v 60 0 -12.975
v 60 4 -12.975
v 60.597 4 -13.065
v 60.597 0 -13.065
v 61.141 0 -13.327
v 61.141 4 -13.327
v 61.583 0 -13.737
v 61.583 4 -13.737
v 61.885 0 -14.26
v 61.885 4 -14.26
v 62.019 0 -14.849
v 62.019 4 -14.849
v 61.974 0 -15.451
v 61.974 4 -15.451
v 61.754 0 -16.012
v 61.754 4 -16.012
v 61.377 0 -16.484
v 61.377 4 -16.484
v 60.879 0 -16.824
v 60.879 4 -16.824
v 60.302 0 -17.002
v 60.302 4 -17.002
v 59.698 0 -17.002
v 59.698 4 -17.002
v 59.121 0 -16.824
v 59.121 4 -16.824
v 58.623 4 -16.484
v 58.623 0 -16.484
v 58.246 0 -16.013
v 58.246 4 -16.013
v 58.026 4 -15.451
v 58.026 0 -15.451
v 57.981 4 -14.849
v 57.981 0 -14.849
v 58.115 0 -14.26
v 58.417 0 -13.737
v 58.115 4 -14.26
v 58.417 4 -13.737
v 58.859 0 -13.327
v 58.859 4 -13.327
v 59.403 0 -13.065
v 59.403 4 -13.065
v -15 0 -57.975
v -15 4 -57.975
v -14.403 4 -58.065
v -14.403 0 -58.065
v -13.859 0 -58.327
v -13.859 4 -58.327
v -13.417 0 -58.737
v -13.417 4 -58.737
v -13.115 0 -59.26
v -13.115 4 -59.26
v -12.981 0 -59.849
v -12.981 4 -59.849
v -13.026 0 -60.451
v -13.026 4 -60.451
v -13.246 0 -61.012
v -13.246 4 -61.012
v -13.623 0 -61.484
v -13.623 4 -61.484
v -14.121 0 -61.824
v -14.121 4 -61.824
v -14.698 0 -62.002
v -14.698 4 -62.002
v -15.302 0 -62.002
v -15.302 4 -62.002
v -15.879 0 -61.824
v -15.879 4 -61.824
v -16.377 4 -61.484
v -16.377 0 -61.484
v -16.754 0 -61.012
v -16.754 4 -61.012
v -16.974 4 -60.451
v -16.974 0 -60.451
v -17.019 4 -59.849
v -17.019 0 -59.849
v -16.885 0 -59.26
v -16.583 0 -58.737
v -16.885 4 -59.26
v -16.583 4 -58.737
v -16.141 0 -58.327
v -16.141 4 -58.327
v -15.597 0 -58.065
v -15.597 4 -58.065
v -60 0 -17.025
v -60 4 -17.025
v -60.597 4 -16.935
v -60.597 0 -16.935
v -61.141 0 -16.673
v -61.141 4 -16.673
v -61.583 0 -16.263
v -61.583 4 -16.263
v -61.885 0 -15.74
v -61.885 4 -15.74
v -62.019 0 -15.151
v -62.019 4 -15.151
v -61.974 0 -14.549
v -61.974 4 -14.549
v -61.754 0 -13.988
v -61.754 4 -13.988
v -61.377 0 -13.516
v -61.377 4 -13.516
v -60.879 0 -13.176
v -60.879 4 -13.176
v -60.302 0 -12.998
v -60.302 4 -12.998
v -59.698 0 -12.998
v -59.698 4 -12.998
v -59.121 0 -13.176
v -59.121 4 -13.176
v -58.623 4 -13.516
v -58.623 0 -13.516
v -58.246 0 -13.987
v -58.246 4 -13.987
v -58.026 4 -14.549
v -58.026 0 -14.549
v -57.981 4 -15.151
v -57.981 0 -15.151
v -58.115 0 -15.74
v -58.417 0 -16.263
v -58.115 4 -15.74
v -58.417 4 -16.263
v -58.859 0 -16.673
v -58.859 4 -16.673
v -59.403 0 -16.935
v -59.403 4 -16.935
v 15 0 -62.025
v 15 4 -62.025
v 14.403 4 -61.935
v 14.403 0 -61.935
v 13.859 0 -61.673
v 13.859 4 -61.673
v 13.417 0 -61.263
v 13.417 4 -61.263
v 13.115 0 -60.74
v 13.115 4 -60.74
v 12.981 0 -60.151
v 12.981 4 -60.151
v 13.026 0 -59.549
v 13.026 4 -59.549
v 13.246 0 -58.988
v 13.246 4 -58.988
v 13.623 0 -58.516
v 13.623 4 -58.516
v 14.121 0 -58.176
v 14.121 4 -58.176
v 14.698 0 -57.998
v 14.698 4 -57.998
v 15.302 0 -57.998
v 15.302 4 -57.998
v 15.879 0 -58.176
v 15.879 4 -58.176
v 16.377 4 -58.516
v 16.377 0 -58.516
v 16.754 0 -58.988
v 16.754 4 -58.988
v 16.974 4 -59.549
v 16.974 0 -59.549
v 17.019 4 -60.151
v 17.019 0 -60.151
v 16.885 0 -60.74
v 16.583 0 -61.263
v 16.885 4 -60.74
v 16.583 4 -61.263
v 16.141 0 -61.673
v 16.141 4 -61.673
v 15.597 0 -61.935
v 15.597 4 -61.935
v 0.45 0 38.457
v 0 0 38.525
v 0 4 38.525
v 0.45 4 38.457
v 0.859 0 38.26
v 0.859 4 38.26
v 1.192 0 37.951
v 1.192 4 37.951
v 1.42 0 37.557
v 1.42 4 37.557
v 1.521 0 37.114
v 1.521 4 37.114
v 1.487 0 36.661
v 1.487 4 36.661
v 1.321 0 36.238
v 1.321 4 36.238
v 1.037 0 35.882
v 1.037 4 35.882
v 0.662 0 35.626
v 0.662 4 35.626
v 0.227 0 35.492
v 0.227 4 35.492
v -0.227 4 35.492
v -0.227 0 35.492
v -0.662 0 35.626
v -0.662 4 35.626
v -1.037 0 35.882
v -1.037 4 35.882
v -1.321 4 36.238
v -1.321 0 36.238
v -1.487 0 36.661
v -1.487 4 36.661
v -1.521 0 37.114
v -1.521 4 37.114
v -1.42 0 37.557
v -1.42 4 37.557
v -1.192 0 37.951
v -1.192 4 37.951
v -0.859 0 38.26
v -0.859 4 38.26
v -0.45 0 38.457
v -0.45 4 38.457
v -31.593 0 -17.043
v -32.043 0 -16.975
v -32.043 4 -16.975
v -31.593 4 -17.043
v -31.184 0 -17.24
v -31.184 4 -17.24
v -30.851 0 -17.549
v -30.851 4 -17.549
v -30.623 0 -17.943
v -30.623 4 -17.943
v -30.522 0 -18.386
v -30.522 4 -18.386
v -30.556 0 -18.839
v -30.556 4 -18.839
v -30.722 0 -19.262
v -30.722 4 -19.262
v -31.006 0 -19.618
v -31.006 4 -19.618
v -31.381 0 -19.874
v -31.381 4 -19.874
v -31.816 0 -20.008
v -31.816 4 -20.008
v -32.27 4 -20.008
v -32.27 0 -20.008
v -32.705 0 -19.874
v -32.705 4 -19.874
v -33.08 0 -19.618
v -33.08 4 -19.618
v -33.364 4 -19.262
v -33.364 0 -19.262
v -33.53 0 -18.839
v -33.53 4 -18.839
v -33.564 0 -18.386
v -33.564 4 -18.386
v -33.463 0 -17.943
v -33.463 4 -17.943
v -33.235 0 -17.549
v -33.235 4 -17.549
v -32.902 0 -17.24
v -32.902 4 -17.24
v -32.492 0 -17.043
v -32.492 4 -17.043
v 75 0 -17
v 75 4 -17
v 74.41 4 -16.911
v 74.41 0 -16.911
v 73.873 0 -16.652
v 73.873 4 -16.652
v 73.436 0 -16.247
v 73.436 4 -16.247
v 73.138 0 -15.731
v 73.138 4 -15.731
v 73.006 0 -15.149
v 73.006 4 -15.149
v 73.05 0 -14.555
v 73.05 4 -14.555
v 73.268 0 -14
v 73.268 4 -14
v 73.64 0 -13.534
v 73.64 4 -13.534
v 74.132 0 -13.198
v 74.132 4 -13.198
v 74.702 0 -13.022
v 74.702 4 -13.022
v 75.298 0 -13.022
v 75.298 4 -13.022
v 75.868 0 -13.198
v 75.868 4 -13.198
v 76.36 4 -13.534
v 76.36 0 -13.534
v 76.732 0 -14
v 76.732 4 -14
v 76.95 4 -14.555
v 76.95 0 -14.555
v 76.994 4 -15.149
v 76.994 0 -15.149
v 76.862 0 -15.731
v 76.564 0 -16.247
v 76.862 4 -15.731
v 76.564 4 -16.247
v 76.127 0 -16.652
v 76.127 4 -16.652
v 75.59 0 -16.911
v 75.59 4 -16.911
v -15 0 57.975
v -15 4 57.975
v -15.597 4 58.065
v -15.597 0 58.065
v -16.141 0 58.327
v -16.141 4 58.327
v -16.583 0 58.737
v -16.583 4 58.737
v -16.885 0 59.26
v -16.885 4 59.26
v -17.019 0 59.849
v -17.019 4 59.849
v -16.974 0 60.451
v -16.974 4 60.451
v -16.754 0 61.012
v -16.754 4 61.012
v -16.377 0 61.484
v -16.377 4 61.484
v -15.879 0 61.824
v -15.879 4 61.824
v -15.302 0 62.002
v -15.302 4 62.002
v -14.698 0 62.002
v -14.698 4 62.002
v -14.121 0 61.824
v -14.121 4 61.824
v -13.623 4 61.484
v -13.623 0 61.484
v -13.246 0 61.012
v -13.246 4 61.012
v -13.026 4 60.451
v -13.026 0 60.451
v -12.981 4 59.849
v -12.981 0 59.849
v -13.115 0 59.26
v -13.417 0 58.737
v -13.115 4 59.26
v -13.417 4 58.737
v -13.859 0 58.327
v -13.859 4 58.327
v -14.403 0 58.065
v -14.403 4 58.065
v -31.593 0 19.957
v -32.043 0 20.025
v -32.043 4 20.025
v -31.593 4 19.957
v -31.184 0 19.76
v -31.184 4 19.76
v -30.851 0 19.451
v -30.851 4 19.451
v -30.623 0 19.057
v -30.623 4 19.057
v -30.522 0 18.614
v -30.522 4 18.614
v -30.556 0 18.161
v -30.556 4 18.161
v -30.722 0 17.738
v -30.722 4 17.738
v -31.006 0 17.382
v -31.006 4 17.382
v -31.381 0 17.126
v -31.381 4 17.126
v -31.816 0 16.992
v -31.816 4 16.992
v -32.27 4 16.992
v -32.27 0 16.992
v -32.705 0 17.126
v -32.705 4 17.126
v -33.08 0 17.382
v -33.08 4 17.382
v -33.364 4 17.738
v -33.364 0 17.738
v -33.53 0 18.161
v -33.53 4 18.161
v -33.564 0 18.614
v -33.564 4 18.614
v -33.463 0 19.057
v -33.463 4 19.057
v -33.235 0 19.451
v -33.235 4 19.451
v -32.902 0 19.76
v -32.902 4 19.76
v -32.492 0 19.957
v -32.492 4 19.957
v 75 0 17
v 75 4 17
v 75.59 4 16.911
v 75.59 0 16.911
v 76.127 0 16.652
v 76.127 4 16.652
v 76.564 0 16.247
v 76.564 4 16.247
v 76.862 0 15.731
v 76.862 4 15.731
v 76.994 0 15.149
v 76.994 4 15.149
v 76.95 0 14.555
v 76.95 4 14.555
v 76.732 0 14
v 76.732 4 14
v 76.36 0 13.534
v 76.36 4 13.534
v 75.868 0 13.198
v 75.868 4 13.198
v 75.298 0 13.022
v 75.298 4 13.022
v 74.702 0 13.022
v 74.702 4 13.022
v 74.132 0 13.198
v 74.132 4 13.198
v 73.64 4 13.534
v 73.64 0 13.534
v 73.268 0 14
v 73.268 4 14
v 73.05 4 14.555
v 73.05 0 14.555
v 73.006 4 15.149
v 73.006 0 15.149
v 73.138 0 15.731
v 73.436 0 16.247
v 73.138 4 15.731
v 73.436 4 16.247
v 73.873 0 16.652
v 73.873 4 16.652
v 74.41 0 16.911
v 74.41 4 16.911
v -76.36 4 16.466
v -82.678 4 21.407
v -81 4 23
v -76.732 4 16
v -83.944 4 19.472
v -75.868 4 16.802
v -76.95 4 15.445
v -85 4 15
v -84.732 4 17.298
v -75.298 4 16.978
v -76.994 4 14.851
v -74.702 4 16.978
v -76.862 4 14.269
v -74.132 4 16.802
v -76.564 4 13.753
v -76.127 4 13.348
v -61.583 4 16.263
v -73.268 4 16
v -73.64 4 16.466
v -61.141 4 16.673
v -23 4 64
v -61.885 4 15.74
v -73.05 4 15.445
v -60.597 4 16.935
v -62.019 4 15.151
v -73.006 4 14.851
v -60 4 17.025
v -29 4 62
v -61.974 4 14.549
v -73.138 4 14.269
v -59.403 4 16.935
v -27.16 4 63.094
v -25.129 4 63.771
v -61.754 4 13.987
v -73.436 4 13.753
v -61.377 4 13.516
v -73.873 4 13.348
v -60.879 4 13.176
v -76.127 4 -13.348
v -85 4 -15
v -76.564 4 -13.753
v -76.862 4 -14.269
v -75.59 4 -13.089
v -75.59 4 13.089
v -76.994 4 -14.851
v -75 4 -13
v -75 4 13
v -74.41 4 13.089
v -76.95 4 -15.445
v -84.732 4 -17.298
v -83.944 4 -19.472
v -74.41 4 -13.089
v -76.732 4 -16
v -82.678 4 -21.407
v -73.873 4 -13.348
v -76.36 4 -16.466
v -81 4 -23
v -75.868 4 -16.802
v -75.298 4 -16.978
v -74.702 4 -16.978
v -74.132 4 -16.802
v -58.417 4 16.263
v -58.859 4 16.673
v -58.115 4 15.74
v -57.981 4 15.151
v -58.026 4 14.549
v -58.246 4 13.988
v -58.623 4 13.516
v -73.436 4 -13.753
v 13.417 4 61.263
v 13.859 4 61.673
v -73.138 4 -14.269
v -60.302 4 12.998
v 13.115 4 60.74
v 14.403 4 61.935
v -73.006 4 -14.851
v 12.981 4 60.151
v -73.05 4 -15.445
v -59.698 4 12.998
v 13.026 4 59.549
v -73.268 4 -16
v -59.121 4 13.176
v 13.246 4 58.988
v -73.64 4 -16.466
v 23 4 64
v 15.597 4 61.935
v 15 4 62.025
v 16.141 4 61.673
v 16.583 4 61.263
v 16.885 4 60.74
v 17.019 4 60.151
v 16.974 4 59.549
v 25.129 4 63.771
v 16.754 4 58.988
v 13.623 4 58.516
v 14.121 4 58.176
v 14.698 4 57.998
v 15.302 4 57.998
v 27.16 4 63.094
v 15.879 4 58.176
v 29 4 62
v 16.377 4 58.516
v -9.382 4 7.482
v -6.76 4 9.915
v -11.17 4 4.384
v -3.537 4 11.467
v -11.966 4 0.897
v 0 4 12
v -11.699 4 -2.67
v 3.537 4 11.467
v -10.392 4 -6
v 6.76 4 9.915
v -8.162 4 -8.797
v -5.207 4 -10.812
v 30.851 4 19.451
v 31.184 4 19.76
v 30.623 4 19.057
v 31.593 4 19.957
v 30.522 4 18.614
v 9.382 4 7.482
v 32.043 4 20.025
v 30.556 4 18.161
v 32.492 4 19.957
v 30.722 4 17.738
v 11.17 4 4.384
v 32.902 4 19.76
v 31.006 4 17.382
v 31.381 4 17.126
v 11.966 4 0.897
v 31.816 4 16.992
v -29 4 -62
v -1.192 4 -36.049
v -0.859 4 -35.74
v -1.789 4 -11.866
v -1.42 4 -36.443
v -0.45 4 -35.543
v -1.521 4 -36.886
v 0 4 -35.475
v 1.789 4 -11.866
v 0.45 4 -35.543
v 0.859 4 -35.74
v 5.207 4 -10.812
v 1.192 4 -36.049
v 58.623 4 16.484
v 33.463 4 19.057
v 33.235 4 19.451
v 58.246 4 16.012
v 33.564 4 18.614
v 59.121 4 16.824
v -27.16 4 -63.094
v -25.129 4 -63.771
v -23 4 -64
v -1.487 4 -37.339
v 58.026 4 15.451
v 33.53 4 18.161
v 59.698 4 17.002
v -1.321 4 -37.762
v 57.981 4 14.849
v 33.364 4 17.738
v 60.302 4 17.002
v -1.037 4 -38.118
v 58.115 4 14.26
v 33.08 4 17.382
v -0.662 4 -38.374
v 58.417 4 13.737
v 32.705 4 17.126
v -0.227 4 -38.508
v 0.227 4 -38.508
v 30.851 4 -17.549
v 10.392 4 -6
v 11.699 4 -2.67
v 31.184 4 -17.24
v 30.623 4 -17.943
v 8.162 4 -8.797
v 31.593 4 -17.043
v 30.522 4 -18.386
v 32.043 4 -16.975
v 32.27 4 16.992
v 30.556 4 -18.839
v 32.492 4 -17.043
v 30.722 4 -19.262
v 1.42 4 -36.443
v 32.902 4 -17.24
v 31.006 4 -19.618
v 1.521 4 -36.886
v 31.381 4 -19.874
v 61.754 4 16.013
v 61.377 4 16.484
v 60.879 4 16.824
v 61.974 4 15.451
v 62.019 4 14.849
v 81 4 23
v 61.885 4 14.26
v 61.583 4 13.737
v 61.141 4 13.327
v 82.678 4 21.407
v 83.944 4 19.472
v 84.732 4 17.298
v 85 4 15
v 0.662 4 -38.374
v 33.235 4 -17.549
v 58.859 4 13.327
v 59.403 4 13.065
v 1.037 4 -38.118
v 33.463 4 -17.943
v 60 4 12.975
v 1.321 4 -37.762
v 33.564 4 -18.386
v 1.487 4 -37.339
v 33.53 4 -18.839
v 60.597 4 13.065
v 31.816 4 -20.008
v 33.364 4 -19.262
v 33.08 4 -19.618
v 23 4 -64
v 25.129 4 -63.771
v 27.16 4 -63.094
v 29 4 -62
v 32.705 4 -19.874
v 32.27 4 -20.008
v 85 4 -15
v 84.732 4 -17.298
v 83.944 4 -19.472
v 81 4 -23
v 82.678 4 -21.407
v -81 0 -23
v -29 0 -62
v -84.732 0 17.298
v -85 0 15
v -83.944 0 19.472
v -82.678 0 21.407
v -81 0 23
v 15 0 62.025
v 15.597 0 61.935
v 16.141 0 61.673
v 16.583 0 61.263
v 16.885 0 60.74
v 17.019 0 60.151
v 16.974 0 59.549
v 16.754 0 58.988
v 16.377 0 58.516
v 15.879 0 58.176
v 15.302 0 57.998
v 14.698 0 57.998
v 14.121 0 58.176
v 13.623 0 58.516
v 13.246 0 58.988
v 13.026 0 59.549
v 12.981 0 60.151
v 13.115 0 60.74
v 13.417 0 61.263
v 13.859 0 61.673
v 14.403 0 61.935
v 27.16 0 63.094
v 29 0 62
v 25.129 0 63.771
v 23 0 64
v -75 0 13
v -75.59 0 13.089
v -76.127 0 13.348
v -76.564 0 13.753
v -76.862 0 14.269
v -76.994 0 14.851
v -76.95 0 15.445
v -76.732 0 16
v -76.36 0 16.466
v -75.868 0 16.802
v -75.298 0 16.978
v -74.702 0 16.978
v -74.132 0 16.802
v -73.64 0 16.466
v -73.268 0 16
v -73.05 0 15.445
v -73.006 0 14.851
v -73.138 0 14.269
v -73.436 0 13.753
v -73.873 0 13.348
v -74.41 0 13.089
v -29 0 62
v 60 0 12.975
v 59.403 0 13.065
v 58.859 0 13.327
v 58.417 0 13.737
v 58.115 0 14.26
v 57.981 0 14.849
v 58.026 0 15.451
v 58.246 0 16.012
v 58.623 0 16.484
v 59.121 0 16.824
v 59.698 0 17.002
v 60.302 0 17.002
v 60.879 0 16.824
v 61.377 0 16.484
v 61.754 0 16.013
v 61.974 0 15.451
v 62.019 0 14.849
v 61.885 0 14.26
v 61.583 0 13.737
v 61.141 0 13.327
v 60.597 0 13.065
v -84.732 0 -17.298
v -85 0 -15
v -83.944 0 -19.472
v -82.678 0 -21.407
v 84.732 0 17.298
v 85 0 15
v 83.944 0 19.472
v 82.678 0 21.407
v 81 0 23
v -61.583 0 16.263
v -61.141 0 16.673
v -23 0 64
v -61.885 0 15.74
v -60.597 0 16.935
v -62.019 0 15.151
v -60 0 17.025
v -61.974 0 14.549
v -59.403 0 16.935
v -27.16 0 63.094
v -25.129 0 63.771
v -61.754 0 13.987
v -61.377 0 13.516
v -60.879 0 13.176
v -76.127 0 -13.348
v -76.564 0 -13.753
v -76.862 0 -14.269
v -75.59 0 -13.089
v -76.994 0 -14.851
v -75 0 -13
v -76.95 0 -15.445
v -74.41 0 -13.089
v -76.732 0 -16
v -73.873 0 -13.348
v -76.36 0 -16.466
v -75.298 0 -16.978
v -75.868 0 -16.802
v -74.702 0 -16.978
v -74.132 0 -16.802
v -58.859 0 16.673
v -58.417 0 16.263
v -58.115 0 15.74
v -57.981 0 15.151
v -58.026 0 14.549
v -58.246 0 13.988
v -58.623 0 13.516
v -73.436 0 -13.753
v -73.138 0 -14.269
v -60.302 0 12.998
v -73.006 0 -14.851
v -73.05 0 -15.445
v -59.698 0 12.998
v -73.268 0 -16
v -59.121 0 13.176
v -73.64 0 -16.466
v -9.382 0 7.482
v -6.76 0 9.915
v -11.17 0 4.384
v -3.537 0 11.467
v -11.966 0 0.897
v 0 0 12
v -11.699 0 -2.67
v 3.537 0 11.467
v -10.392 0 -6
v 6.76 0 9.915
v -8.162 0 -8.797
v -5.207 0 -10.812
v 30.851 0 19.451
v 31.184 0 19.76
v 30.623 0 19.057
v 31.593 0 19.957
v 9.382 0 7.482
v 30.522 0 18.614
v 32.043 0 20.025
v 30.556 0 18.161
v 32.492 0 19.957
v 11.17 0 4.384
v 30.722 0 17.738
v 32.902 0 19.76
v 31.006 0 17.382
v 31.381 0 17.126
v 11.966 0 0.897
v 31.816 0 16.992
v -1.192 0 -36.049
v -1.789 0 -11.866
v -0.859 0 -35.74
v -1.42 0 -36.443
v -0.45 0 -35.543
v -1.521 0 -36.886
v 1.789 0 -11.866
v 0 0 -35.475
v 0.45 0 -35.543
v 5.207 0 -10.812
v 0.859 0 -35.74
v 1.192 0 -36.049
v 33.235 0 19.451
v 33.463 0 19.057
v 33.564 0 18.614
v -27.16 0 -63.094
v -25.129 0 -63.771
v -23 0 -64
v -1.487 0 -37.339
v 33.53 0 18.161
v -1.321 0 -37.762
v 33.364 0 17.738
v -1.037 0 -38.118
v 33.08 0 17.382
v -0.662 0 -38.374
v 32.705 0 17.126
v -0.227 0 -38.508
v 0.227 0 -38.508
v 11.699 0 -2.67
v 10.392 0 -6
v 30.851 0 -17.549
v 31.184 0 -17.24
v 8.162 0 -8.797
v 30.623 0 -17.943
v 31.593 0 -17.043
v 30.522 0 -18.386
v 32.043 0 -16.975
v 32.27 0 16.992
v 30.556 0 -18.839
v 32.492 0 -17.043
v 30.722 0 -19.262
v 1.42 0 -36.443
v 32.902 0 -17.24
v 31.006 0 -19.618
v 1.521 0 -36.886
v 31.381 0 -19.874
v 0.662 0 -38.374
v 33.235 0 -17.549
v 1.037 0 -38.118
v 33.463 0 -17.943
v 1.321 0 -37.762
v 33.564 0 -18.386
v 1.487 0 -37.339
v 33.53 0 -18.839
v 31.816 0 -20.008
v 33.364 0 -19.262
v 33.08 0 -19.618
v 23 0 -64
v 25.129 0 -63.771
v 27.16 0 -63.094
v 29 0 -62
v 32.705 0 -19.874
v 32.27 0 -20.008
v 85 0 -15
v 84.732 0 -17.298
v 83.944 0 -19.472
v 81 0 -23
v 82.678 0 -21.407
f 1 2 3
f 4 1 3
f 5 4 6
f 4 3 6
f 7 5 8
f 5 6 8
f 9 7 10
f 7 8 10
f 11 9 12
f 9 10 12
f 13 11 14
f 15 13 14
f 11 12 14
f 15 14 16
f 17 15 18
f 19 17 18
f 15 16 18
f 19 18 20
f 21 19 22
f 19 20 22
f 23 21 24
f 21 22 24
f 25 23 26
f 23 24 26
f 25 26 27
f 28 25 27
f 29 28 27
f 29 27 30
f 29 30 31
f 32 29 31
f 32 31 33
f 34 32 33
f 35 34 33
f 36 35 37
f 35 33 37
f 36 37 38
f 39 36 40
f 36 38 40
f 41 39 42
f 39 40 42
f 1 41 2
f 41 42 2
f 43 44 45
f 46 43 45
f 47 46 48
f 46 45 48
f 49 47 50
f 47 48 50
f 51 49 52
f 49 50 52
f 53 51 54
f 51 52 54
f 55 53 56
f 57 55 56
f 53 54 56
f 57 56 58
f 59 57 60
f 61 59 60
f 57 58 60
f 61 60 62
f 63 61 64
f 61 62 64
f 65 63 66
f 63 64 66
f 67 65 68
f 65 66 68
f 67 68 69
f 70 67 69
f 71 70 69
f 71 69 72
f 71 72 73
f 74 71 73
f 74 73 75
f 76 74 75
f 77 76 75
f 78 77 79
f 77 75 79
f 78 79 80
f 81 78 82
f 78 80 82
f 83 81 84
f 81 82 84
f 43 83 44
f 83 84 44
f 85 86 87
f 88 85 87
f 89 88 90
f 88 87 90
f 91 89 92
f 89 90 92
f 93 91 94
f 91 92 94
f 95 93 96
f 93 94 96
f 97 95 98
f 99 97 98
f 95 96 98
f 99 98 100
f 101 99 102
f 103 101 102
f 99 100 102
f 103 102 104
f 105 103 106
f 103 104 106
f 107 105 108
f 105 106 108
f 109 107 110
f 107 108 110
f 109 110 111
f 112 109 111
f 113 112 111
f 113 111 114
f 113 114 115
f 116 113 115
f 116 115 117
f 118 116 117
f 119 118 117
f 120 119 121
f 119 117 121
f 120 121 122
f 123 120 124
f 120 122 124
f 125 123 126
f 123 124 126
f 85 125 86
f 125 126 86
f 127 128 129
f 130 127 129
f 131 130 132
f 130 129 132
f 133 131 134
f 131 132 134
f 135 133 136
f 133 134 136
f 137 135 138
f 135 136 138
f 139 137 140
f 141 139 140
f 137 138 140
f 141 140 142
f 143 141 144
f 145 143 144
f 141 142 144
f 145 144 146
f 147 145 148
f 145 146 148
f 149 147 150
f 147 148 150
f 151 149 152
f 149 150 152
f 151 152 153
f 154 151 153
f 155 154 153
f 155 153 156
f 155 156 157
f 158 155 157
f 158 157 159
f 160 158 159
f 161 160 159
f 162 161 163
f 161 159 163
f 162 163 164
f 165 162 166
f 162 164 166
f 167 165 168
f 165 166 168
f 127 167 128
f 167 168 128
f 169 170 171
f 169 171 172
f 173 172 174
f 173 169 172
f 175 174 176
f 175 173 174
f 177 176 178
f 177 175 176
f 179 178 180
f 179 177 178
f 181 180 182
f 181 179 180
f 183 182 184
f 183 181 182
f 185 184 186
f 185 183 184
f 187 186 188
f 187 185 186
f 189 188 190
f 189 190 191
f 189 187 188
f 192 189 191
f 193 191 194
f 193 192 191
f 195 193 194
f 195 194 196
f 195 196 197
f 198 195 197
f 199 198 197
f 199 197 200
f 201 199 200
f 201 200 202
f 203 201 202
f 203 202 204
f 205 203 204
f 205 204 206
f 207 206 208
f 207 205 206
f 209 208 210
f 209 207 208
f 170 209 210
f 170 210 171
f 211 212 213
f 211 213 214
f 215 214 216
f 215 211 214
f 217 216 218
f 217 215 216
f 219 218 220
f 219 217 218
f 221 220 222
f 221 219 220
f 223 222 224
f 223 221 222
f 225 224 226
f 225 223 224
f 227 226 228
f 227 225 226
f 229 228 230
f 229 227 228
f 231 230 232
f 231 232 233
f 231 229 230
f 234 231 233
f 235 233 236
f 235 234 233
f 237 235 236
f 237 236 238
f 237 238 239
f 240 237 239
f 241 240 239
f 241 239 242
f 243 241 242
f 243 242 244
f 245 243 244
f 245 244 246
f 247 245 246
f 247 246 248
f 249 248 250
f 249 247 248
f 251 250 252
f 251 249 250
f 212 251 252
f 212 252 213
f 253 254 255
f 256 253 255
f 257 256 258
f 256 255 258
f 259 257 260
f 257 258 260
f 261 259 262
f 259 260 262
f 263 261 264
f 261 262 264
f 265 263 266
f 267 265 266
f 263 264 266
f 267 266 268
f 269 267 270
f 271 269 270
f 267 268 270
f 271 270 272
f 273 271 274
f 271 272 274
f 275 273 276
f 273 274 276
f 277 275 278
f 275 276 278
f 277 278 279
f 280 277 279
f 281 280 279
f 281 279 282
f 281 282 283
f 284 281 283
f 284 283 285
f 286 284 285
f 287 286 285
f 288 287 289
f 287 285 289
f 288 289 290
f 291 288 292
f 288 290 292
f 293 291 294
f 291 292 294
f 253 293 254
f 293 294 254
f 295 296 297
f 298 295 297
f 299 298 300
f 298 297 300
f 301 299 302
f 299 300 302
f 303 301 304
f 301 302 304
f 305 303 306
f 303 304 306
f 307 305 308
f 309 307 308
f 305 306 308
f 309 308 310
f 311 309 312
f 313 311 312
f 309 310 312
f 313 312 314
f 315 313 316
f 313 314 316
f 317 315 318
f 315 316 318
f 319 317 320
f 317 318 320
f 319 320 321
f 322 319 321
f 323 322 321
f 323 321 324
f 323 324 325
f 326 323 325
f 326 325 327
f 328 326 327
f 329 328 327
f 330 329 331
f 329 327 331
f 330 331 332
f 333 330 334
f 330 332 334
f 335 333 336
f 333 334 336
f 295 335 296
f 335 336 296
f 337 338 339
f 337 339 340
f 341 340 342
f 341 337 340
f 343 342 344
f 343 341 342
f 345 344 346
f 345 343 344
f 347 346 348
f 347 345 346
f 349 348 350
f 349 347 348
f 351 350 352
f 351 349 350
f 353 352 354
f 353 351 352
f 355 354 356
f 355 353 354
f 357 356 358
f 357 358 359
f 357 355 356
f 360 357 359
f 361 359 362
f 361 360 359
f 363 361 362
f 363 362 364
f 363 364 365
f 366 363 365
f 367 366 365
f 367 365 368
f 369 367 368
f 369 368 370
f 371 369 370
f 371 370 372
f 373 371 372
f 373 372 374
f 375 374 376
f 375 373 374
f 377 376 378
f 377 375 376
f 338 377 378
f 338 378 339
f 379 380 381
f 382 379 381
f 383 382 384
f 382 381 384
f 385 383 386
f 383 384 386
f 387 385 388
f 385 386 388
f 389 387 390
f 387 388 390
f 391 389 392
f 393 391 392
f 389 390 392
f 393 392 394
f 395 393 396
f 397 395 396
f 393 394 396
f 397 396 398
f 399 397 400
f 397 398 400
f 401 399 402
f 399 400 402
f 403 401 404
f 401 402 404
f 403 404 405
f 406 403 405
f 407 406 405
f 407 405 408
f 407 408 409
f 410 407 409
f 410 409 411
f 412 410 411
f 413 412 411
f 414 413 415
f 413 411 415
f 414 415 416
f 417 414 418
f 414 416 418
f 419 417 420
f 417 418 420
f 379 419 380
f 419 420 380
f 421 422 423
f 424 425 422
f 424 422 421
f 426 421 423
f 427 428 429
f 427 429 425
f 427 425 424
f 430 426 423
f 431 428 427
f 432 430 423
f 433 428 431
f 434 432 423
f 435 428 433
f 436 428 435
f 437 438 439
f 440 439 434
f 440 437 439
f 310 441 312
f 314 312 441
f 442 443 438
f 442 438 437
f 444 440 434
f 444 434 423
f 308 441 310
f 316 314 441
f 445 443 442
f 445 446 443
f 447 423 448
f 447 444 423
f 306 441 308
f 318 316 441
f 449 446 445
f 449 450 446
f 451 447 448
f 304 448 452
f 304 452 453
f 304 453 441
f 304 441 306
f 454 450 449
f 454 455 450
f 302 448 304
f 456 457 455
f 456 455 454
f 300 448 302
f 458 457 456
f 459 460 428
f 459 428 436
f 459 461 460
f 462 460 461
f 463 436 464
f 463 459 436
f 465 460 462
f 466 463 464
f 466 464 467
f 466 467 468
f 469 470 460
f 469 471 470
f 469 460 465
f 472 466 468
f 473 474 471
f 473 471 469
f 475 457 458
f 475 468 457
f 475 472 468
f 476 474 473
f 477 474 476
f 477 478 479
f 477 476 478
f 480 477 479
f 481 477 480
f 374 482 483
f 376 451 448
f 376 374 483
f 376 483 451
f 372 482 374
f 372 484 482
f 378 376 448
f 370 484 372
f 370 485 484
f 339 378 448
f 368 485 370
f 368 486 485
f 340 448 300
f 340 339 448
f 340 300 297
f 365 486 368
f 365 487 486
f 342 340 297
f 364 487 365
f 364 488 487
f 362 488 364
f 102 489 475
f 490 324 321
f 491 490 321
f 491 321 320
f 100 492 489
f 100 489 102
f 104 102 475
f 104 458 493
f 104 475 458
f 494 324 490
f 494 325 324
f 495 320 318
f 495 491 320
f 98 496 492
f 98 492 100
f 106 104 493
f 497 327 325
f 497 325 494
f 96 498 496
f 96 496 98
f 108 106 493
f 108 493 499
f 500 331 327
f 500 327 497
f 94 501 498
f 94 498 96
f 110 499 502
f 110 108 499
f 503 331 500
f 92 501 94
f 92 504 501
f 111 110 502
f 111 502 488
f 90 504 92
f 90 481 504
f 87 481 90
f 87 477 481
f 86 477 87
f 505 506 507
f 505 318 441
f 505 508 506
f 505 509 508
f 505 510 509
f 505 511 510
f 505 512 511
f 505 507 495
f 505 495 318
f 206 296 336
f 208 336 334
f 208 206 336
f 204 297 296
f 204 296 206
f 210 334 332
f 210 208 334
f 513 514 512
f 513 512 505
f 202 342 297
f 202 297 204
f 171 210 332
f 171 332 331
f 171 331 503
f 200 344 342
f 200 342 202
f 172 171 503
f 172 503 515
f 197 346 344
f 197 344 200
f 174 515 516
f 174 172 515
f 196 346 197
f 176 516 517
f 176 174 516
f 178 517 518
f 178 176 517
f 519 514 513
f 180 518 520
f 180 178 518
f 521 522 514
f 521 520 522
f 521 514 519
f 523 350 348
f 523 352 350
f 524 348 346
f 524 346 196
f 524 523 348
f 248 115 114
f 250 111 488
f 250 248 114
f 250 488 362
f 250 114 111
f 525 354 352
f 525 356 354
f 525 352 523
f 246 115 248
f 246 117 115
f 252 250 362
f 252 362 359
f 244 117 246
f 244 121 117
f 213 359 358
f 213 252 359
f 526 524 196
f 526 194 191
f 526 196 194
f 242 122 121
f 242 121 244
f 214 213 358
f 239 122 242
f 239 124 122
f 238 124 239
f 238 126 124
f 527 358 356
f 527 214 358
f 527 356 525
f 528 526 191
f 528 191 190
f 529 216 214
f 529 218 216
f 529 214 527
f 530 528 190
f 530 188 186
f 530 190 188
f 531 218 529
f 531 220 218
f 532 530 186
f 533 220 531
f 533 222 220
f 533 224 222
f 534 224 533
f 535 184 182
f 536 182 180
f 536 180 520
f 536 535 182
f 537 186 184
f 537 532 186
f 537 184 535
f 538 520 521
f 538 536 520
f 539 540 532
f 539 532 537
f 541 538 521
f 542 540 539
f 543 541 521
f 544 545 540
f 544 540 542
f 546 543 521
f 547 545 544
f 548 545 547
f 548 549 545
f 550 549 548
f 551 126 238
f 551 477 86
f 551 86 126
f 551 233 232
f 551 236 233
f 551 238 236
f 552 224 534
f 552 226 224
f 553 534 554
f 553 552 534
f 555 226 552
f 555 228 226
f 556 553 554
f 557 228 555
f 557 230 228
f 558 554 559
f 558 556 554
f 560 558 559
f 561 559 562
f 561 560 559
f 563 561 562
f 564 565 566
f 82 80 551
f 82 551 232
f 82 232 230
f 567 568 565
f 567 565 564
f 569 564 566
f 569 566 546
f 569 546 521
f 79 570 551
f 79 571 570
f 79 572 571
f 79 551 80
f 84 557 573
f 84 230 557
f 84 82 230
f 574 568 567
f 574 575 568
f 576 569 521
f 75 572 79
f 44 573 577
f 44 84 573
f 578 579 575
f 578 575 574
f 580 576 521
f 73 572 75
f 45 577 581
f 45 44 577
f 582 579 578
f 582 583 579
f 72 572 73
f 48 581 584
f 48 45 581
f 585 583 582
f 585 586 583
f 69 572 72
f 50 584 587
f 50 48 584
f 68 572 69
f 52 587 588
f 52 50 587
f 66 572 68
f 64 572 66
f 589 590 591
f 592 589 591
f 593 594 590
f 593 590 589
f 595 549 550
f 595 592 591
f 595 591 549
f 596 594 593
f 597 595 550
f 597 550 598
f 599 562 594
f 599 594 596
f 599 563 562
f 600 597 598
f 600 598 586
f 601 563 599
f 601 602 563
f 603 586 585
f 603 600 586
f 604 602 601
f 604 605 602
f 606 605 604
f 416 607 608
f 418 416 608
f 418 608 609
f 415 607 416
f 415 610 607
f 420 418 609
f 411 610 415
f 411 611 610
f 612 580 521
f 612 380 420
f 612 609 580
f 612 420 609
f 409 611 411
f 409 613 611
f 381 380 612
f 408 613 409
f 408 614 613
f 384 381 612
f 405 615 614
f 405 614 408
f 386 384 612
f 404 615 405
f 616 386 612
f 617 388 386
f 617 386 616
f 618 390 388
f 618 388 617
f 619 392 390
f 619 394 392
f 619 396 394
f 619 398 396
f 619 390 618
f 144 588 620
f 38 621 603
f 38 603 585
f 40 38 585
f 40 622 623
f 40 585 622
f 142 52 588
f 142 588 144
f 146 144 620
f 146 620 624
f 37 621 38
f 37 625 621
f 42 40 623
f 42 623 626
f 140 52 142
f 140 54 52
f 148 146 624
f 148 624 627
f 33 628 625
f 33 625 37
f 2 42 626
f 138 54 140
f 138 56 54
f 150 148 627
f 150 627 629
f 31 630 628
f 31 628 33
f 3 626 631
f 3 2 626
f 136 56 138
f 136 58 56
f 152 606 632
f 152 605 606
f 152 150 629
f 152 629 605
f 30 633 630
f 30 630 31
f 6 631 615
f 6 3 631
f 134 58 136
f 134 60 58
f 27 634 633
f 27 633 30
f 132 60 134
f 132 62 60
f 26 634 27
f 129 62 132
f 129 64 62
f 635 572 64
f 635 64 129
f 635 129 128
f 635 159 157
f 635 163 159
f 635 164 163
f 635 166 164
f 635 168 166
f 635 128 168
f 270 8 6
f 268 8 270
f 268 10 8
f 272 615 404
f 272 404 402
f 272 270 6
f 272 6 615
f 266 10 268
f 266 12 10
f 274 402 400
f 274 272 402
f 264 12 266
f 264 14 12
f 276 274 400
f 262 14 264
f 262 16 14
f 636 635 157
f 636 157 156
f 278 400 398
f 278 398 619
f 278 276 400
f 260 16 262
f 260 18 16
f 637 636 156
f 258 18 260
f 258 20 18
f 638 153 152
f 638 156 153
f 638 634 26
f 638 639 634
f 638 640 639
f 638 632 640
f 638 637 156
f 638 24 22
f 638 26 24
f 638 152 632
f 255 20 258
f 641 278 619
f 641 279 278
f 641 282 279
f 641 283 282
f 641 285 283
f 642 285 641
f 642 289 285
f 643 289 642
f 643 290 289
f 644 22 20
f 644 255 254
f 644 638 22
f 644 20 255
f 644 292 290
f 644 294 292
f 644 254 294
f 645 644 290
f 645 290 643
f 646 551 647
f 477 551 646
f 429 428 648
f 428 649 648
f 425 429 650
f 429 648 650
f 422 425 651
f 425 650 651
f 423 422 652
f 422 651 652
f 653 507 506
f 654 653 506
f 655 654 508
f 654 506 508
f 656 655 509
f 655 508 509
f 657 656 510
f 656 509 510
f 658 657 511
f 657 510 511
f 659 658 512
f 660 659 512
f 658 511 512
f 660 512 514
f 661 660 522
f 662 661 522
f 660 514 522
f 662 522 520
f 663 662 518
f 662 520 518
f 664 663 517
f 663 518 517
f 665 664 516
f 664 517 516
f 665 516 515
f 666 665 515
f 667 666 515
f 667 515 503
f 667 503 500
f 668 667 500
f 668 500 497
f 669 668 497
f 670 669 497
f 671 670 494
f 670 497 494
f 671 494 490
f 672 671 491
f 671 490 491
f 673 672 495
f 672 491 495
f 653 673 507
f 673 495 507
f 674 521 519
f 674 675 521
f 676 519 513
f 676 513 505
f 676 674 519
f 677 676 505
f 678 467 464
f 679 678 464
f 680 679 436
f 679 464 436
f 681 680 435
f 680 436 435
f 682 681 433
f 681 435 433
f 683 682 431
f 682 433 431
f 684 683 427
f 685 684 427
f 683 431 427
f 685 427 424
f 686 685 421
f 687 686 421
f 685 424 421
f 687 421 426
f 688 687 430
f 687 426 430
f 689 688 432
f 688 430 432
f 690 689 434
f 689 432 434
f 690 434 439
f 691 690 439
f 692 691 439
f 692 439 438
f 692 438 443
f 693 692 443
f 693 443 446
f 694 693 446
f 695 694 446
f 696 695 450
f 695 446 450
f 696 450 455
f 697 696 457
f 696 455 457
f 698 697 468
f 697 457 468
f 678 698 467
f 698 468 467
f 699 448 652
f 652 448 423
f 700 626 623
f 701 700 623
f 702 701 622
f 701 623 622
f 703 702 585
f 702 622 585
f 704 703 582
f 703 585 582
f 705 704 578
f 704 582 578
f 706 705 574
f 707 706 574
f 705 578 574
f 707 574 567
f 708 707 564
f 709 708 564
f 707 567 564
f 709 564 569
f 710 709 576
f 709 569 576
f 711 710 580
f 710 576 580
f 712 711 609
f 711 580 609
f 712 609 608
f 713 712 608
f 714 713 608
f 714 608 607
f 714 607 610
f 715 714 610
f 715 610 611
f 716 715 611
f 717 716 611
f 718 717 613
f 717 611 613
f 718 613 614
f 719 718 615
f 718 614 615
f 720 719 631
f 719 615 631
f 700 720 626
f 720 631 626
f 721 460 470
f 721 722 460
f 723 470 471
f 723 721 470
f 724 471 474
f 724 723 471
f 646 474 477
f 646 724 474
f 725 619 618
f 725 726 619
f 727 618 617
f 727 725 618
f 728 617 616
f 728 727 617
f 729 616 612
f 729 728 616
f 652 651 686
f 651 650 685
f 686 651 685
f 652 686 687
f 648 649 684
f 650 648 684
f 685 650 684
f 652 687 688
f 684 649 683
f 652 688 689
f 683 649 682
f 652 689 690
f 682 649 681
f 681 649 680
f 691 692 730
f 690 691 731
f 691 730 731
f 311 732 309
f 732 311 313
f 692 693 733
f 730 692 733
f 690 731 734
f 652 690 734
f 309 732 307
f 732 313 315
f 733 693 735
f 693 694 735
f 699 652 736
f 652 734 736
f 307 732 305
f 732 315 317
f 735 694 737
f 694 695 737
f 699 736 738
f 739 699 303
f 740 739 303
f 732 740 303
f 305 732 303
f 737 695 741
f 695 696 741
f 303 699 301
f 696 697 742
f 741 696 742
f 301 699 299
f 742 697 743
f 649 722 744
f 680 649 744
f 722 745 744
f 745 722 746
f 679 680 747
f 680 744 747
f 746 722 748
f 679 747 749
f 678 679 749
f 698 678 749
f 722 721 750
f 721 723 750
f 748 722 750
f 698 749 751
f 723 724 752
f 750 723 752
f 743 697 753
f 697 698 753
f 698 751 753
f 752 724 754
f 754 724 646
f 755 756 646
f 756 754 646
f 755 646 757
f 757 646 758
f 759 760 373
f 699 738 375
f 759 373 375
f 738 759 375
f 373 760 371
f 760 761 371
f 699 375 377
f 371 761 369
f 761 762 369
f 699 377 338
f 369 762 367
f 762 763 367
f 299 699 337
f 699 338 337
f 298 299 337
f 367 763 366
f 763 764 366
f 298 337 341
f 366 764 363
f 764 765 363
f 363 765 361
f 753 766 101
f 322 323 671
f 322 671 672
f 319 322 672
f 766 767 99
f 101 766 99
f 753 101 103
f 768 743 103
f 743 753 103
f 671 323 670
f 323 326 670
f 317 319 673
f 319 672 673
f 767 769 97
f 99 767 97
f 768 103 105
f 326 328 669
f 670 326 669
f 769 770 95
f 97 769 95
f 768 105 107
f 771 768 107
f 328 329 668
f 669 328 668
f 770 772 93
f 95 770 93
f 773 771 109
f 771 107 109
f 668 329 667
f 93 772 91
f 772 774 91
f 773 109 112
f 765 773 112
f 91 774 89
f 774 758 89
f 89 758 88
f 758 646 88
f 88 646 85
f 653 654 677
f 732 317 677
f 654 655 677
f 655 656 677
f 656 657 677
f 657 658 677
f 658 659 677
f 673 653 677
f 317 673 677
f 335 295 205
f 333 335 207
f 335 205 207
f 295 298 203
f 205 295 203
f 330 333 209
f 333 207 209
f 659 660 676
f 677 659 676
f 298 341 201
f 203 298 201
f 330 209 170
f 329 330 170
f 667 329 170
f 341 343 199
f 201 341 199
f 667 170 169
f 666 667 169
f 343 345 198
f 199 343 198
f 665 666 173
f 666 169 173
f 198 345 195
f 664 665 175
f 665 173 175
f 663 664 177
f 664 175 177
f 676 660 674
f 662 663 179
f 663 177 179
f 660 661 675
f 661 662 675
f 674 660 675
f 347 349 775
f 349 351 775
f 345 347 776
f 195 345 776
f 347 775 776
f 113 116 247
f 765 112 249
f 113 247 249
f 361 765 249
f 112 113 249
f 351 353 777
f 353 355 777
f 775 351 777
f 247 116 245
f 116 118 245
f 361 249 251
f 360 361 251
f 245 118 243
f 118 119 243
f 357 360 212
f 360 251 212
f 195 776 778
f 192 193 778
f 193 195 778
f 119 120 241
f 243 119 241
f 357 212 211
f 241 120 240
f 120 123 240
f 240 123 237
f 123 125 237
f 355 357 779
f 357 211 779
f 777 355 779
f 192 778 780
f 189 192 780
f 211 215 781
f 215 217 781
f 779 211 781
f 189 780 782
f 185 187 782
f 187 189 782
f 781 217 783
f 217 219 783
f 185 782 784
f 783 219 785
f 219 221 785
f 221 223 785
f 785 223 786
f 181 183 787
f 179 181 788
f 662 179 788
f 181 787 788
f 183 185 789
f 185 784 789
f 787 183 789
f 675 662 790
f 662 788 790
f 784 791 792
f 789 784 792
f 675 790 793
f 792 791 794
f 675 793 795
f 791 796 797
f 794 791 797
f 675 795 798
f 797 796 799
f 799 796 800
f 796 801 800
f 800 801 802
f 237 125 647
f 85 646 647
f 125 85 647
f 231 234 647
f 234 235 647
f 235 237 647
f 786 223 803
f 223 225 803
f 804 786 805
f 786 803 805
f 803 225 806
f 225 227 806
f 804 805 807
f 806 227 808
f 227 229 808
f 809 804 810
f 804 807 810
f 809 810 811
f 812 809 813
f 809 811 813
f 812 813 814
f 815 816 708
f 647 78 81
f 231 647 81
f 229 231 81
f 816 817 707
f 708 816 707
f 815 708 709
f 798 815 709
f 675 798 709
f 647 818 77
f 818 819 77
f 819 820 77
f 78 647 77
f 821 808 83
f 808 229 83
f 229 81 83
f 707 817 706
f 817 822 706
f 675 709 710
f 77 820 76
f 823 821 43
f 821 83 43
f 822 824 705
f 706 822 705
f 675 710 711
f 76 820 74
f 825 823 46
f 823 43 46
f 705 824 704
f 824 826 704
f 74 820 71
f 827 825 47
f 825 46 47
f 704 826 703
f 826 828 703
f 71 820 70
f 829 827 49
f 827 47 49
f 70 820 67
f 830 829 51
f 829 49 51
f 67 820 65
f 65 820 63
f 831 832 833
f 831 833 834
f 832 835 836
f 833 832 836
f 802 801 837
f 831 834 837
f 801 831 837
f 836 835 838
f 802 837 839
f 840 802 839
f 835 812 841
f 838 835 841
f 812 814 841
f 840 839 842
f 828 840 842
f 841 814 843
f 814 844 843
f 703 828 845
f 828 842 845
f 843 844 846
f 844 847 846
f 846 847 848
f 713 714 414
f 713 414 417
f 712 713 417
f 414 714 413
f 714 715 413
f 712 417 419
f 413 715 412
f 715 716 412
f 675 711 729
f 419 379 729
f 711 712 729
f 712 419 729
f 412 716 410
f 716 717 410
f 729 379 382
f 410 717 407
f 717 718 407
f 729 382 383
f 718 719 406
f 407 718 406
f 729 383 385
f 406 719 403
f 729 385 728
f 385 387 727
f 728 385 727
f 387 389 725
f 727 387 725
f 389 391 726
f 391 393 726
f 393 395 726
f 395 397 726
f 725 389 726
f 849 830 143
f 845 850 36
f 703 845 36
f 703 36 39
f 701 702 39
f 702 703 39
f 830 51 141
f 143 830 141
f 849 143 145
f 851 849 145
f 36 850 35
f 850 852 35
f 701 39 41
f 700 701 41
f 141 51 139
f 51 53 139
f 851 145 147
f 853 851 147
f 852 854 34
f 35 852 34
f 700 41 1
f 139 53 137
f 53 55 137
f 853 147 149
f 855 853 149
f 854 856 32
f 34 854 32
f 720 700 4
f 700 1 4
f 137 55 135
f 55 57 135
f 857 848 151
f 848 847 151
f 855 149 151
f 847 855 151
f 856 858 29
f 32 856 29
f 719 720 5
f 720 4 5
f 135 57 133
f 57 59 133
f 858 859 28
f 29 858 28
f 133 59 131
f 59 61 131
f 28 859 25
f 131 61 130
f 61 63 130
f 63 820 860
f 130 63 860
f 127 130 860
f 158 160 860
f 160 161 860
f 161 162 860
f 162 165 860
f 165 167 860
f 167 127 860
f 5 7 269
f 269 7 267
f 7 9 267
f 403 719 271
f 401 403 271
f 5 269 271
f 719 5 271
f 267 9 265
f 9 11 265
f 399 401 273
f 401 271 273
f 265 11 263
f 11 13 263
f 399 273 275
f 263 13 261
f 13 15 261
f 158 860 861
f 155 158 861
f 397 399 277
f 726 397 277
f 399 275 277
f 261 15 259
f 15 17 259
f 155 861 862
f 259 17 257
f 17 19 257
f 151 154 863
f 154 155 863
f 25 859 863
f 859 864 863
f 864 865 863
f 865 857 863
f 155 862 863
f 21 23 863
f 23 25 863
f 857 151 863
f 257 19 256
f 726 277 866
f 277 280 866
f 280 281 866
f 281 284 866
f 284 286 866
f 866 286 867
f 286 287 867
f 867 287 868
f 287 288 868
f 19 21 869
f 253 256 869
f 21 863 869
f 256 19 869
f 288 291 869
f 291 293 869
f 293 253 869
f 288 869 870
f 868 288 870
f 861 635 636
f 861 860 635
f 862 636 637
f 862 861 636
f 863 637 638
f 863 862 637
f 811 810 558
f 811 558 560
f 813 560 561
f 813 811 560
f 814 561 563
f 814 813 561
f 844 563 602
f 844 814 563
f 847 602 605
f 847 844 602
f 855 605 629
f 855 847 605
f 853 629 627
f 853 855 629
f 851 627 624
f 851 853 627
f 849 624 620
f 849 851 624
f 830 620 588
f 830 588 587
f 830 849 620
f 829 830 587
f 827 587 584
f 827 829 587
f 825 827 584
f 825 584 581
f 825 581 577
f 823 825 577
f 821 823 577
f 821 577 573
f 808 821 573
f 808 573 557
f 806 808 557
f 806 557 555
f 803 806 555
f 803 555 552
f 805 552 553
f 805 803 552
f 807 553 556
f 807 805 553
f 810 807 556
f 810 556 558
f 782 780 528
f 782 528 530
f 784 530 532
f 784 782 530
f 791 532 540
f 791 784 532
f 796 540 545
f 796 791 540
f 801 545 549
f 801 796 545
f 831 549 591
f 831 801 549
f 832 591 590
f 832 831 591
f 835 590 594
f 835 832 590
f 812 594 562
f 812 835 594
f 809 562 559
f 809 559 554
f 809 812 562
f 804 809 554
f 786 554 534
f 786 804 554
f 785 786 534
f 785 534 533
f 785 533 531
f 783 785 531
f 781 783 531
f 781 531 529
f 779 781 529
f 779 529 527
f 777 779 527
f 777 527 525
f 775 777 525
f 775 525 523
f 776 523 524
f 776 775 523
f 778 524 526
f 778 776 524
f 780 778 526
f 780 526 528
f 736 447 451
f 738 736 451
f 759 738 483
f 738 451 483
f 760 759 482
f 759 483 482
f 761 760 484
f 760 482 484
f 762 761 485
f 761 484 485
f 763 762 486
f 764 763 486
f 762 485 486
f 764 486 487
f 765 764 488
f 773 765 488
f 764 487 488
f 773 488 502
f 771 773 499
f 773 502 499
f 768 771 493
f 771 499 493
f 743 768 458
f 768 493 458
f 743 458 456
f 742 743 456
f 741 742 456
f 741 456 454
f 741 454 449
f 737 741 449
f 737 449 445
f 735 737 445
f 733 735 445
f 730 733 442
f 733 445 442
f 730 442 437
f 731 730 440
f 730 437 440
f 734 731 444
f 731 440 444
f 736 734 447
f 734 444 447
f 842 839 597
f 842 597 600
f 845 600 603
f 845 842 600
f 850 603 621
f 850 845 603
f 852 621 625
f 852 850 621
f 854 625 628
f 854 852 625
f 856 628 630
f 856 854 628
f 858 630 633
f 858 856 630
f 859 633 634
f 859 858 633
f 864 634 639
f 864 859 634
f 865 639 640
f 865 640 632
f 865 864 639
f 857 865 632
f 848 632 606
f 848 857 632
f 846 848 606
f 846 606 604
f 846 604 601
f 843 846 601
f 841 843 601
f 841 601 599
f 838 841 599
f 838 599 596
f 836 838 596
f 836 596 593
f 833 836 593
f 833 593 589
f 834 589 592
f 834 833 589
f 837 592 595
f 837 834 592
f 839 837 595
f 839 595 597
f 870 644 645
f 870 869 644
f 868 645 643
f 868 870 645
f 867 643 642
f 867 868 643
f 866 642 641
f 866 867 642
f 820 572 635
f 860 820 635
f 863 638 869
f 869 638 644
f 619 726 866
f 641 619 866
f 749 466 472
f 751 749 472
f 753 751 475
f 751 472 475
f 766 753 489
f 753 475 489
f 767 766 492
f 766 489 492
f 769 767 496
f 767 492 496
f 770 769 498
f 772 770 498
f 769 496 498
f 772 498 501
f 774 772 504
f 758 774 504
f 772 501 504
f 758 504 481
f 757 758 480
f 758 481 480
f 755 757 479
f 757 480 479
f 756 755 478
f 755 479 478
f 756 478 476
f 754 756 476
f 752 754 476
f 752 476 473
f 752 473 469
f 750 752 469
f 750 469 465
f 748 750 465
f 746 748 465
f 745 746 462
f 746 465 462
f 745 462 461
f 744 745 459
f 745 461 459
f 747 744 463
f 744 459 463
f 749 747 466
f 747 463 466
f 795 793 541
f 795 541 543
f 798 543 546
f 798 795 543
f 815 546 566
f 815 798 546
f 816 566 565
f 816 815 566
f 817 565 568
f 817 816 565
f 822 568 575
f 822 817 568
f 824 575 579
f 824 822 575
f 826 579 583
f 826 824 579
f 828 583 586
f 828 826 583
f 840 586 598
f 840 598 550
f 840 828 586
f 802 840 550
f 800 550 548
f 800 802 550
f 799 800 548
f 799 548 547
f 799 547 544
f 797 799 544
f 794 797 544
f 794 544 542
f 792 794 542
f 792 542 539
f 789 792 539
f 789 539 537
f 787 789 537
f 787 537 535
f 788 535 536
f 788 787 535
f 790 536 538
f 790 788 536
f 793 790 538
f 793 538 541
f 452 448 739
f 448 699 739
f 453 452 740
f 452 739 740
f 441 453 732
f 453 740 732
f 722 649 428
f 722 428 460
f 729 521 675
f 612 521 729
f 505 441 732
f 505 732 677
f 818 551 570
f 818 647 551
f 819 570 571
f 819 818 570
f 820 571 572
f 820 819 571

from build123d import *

# Parameters (mm, degrees)
SKETCH_1_W          = 170
SKETCH_1_H          = 130
SKETCH_1_R          = 1.525
SKETCH_1_R_2        = 12
EXTRUDE_1_DEPTH     = 4
SKETCH_2_R          = 2.025
SKETCH_2_R_2        = 2
SKETCH_2_W          = 20
SKETCH_2_H          = 20
CUT_EXTRUDE_1_DEPTH = 4
CUT_EXTRUDE_2_DEPTH = 10
SKETCH_4_W          = 52.666666666
SKETCH_4_H          = 5
CUT_EXTRUDE_3_DEPTH = 108.079409785
FILLET_1_R          = 10


with BuildPart() as part:
    # 草图1 → 凸台-拉伸1 (new body)
    with BuildSketch(Plane(origin=(0, 0, 0), x_dir=(1, 0, 0), z_dir=(0, 1, 0))):
        Rectangle(SKETCH_1_W, SKETCH_1_H)
        with Locations(Location((0, -37, 0), (0, 0, 270))):
            Circle(SKETCH_1_R, mode=Mode.SUBTRACT)
        with Locations(Location((-32.04293994, -18.5, 0), (0, 0, 270))):
            Circle(SKETCH_1_R, mode=Mode.SUBTRACT)
        with Locations(Location((-32.04293994, 18.5, 0), (0, 0, 270))):
            Circle(SKETCH_1_R, mode=Mode.SUBTRACT)
        with Locations(Location((0, 37, 0), (0, 0, 270))):
            Circle(SKETCH_1_R, mode=Mode.SUBTRACT)
        with Locations(Location((32.04293994, 18.5, 0), (0, 0, 270))):
            Circle(SKETCH_1_R, mode=Mode.SUBTRACT)
        with Locations(Location((32.04293994, -18.5, 0), (0, 0, 270))):
            Circle(SKETCH_1_R, mode=Mode.SUBTRACT)
        with Locations(Location((0, 0, 0), (0, 0, 270))):
            Circle(SKETCH_1_R_2, mode=Mode.SUBTRACT)
    extrude(amount=EXTRUDE_1_DEPTH)

    # 草图2 → 切除-拉伸1 (cut)
    with BuildSketch(Plane(origin=(0, 4, 0), x_dir=(1, 0, 0), z_dir=(0, 1, 0))):
        with Locations(Location((-15, 60, 0), (0, 0, 270))):
            Circle(SKETCH_2_R)
        with Locations(Location((-75, 15, 0), (0, 0, 270))):
            Circle(SKETCH_2_R_2)
        with Locations(Location((75, 15, 0), (0, 0, 90))):
            Circle(SKETCH_2_R_2)
        with Locations(Location((15, 60, 0), (0, 0, 90))):
            Circle(SKETCH_2_R)
        with Locations(Location((75, -15, 0), (0, 0, 270))):
            Circle(SKETCH_2_R_2)
        with Locations(Location((-75, -15, 0), (0, 0, 90))):
            Circle(SKETCH_2_R_2)
        with Locations(Location((60, 15, 0), (0, 0, 270))):
            Circle(SKETCH_2_R)
        with Locations(Location((60, -15, 0), (0, 0, 90))):
            Circle(SKETCH_2_R)
        with Locations(Location((15, -60, 0), (0, 0, 270))):
            Circle(SKETCH_2_R)
        with Locations(Location((-15, -60, 0), (0, 0, 90))):
            Circle(SKETCH_2_R)
        with Locations(Location((-60, -15, 0), (0, 0, 270))):
            Circle(SKETCH_2_R)
        with Locations(Location((-60, 15, 0), (0, 0, 90))):
            Circle(SKETCH_2_R)
        with Locations((-75, 55)):
            Rectangle(SKETCH_2_W, SKETCH_2_H)
        with Locations((75, 55)):
            Rectangle(SKETCH_2_W, SKETCH_2_H)
        with Locations((75, -55)):
            Rectangle(SKETCH_2_W, SKETCH_2_H)
        with Locations((-75, -55)):
            Rectangle(SKETCH_2_W, SKETCH_2_H)
    extrude(amount=-CUT_EXTRUDE_1_DEPTH, mode=Mode.SUBTRACT)

    # 草图3 → 切除-拉伸2 (cut)
    with BuildSketch(Plane(origin=(0, 4, 0), x_dir=(1, 0, 0), z_dir=(0, 1, 0))):
        Polygon((-85, 20), (-85, 65), (-25, 65), align=None)
        Polygon((-85, -65), (-25, -65), (-85, -20), align=None)
        Polygon((85, -20), (85, -65), (25, -65), align=None)
        Polygon((85, 65), (25, 65), (85, 20), align=None)
    extrude(amount=-CUT_EXTRUDE_2_DEPTH, mode=Mode.SUBTRACT)

    # 草图4 → 切除-拉伸3 (cut, through all)
    with BuildSketch(Plane(origin=(0, 4, 0), x_dir=(1, 0, 0), z_dir=(0, 1, 0))):
        with Locations((0, 66.5)):
            Rectangle(SKETCH_4_W, SKETCH_4_H)
        with Locations((0, -66.5)):
            Rectangle(SKETCH_4_W, SKETCH_4_H)
    extrude(amount=-CUT_EXTRUDE_3_DEPTH, mode=Mode.SUBTRACT)

    # 圆角1
    fillet_1_edges = [part.edges().sort_by_distance(p)[0] for p in [
        (85, 2, -20),
        (85, 2, 20),
        (-85, 2, 20),
        (-85, 2, -20),
        (-26.333333333, 2, -64),
        (26.333333333, 2, -64),
        (-26.333333333, 2, 64),
        (26.333333333, 2, 64),
    ]]
    fillet(fillet_1_edges, radius=FILLET_1_R)


solid = part.part
